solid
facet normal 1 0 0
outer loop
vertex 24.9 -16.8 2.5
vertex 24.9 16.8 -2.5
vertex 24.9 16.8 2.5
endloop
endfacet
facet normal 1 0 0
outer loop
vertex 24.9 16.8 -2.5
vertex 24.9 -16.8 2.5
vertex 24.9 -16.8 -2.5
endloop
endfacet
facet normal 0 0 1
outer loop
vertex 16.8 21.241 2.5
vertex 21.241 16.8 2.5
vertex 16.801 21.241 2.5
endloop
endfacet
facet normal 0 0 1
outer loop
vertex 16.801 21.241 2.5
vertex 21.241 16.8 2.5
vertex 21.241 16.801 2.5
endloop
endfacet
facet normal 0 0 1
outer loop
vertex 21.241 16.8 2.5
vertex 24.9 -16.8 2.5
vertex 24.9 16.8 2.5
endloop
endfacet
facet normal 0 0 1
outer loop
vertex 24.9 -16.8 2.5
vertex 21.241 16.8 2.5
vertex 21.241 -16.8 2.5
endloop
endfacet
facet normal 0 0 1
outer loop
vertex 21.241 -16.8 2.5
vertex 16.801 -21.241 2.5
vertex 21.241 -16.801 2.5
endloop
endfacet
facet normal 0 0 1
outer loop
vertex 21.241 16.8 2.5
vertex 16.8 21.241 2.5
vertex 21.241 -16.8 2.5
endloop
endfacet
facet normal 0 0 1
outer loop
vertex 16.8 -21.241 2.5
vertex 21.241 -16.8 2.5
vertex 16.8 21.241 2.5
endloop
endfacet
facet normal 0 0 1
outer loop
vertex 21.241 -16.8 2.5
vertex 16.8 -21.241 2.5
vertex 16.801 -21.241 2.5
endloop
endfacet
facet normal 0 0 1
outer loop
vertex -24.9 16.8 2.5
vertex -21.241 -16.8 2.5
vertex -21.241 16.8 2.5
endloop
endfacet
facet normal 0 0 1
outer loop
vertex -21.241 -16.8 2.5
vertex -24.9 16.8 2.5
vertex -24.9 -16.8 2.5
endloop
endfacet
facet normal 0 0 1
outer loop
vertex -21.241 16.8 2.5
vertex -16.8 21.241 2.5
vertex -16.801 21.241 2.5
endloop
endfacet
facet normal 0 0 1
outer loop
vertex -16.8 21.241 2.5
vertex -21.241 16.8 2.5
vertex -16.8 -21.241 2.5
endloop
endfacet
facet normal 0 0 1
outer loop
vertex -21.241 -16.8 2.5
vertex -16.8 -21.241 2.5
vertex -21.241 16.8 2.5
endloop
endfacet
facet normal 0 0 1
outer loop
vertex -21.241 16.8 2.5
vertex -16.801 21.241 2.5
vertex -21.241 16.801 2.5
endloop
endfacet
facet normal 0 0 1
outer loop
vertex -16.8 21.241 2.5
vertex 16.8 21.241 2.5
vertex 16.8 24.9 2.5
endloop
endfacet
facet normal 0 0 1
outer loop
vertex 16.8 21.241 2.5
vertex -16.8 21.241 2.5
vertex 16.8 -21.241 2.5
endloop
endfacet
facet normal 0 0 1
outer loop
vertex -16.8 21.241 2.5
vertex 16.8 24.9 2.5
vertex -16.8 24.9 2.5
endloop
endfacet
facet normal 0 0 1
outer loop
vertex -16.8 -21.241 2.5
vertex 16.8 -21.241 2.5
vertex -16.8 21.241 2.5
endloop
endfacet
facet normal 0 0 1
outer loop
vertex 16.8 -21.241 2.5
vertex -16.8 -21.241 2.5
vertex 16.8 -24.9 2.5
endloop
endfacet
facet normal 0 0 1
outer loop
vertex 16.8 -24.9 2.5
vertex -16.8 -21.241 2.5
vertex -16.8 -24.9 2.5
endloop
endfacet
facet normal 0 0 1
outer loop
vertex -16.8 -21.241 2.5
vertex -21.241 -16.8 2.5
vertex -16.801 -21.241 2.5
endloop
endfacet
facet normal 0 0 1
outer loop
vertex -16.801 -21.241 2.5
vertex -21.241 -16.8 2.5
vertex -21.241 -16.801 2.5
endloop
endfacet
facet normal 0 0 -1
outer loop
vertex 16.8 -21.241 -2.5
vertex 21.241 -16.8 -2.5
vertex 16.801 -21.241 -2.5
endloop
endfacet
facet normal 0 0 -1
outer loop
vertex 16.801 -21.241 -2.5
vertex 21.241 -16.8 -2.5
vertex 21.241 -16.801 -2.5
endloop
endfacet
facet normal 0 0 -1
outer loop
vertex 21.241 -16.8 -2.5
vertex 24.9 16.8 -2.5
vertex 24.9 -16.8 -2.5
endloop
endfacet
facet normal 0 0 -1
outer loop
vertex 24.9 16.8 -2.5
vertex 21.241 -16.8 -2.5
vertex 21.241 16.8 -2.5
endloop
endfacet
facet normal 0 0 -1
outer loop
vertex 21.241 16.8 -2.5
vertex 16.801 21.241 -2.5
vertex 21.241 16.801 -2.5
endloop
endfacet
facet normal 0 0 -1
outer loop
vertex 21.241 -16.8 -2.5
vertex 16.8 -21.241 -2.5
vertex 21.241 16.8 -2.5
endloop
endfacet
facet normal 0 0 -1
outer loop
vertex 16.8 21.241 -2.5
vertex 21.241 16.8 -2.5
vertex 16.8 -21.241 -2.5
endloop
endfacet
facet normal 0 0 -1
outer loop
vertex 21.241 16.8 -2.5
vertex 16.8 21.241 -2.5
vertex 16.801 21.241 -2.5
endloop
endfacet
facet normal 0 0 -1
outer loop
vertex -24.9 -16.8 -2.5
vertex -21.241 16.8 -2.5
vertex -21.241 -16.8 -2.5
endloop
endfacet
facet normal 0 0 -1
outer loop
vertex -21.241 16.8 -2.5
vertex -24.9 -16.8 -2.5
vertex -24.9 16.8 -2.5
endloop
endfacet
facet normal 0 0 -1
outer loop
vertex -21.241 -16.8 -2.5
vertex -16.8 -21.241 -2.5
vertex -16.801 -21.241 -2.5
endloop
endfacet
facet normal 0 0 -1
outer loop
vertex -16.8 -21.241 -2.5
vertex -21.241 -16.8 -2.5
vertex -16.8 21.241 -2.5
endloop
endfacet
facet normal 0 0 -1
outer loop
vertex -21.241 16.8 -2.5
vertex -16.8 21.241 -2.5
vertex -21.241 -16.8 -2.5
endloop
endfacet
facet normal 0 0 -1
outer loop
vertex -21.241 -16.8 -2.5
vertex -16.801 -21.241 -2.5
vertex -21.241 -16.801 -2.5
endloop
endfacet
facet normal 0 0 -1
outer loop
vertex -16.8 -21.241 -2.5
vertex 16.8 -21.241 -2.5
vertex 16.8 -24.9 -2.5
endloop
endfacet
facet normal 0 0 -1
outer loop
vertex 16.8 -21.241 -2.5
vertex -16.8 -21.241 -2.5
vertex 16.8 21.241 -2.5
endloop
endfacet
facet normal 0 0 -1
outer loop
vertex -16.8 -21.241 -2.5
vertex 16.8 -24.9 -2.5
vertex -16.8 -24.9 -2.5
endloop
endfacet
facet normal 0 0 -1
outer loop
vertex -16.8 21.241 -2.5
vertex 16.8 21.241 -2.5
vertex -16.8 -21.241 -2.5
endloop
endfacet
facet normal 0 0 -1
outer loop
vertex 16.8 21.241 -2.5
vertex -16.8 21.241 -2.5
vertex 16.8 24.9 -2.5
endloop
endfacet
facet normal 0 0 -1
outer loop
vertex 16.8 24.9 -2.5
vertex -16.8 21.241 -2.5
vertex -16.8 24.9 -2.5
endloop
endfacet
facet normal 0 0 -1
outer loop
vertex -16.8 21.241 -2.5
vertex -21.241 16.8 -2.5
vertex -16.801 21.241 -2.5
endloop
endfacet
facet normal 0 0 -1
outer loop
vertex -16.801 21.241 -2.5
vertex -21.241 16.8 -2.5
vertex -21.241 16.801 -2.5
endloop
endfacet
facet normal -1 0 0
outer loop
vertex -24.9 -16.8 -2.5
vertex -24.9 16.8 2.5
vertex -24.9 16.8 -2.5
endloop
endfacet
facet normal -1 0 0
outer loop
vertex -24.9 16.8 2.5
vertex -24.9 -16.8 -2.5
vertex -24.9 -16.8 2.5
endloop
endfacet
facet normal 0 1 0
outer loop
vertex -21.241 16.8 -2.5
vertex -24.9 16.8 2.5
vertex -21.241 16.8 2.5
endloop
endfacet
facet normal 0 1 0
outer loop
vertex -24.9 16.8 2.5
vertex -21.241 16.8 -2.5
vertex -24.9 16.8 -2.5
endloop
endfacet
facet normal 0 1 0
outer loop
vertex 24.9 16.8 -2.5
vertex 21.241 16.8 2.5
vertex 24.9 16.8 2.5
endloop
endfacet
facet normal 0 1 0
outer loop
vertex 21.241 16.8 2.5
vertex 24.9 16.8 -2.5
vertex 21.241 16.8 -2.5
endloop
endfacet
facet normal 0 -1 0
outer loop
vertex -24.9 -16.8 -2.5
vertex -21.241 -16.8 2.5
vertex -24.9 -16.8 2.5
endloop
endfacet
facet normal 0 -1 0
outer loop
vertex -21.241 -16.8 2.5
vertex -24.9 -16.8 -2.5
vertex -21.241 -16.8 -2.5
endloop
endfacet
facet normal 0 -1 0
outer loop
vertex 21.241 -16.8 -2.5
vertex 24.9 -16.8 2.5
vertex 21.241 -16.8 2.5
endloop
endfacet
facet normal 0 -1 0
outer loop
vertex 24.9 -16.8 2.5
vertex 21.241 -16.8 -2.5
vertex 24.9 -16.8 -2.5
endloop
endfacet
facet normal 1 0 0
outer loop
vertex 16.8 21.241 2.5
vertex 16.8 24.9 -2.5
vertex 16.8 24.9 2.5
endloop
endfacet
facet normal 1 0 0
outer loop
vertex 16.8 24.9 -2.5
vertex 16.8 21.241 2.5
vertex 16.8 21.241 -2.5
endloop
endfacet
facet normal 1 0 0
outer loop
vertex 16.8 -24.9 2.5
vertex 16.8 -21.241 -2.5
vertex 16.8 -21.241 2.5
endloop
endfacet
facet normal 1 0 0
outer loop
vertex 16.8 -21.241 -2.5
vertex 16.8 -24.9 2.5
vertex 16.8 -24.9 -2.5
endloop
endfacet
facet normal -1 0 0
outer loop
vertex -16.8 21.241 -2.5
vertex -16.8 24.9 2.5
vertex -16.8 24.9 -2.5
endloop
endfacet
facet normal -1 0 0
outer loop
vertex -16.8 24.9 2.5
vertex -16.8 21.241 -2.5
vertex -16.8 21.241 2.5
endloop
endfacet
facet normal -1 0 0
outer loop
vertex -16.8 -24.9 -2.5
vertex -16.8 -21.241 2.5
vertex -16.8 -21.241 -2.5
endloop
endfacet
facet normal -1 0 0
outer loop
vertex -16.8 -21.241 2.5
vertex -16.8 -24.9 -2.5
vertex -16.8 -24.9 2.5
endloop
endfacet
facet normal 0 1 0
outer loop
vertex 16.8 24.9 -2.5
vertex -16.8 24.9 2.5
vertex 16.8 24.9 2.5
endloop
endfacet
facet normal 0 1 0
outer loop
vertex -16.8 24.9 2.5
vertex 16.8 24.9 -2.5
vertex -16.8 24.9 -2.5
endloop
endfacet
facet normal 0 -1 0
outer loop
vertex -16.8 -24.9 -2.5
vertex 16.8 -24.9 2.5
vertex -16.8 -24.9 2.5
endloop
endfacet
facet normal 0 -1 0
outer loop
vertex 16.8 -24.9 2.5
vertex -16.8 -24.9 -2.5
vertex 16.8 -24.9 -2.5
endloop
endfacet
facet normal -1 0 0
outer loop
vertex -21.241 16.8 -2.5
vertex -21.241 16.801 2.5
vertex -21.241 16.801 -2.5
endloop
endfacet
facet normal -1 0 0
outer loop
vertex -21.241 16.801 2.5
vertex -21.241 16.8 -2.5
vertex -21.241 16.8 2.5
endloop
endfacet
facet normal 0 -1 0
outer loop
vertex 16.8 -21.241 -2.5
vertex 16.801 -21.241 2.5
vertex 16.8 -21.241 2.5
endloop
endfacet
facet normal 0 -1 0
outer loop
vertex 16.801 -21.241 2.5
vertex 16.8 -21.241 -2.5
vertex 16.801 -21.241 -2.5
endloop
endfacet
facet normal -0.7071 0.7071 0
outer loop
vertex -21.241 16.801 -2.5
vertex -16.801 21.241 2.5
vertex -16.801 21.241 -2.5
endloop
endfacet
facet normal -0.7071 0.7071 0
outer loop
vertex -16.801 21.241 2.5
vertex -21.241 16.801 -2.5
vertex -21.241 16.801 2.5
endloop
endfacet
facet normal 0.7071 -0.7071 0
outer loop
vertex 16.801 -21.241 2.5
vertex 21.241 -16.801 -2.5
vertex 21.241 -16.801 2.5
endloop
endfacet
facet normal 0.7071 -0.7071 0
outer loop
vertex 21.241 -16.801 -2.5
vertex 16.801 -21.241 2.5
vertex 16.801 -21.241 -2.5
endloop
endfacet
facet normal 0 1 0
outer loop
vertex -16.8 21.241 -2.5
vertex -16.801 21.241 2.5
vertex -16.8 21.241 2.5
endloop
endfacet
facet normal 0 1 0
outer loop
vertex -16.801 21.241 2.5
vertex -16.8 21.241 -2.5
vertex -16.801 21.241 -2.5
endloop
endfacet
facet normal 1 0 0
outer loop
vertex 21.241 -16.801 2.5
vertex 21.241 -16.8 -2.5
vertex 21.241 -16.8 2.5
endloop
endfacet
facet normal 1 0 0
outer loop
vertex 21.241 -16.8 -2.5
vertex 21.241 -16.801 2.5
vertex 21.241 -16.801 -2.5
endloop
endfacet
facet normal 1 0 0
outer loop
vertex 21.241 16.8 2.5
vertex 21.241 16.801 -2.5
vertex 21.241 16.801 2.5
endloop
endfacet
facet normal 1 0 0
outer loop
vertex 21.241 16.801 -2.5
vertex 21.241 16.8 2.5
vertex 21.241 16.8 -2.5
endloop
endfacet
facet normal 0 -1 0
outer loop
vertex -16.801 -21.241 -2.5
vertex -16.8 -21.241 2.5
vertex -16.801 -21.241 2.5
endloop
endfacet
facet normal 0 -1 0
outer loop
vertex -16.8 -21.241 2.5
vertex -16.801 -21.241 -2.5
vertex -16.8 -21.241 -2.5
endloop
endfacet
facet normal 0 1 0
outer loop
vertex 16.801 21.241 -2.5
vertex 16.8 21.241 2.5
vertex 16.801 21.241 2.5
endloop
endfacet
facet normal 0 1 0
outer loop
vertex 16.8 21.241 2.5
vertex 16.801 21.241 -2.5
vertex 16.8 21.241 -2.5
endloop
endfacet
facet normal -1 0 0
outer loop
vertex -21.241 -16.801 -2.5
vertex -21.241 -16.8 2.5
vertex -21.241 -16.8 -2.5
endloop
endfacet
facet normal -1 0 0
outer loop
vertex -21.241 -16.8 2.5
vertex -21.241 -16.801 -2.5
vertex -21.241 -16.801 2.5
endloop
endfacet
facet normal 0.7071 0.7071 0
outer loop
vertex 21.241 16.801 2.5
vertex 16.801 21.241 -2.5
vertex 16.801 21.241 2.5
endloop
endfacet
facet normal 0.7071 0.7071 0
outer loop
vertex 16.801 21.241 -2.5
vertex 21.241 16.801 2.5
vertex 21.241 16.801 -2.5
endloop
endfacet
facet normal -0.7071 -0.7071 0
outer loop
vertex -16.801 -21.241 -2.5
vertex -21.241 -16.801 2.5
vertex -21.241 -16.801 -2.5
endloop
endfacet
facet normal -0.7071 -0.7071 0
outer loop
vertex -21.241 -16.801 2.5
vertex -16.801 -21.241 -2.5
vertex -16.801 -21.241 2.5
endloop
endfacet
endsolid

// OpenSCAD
//Cube insert: Perpendicular 

/* [Hiden] */
$fn = 80;
eps = .002;
a = 49.8;
b = 33.6;
c = 6.28;
d = 53.8;
h = 5;

insert();

module insert() {
    union() {   //basic insert design
            cube([a,b,h], center=true);
            cube([b,a,h], center=true);
            rotate(a=[0,0,45]){
                cube([c,d,h], center=true);
            }
            rotate(a=[0,0,-45]){
                cube([c,d,h], center=true);
            }
        }
}
